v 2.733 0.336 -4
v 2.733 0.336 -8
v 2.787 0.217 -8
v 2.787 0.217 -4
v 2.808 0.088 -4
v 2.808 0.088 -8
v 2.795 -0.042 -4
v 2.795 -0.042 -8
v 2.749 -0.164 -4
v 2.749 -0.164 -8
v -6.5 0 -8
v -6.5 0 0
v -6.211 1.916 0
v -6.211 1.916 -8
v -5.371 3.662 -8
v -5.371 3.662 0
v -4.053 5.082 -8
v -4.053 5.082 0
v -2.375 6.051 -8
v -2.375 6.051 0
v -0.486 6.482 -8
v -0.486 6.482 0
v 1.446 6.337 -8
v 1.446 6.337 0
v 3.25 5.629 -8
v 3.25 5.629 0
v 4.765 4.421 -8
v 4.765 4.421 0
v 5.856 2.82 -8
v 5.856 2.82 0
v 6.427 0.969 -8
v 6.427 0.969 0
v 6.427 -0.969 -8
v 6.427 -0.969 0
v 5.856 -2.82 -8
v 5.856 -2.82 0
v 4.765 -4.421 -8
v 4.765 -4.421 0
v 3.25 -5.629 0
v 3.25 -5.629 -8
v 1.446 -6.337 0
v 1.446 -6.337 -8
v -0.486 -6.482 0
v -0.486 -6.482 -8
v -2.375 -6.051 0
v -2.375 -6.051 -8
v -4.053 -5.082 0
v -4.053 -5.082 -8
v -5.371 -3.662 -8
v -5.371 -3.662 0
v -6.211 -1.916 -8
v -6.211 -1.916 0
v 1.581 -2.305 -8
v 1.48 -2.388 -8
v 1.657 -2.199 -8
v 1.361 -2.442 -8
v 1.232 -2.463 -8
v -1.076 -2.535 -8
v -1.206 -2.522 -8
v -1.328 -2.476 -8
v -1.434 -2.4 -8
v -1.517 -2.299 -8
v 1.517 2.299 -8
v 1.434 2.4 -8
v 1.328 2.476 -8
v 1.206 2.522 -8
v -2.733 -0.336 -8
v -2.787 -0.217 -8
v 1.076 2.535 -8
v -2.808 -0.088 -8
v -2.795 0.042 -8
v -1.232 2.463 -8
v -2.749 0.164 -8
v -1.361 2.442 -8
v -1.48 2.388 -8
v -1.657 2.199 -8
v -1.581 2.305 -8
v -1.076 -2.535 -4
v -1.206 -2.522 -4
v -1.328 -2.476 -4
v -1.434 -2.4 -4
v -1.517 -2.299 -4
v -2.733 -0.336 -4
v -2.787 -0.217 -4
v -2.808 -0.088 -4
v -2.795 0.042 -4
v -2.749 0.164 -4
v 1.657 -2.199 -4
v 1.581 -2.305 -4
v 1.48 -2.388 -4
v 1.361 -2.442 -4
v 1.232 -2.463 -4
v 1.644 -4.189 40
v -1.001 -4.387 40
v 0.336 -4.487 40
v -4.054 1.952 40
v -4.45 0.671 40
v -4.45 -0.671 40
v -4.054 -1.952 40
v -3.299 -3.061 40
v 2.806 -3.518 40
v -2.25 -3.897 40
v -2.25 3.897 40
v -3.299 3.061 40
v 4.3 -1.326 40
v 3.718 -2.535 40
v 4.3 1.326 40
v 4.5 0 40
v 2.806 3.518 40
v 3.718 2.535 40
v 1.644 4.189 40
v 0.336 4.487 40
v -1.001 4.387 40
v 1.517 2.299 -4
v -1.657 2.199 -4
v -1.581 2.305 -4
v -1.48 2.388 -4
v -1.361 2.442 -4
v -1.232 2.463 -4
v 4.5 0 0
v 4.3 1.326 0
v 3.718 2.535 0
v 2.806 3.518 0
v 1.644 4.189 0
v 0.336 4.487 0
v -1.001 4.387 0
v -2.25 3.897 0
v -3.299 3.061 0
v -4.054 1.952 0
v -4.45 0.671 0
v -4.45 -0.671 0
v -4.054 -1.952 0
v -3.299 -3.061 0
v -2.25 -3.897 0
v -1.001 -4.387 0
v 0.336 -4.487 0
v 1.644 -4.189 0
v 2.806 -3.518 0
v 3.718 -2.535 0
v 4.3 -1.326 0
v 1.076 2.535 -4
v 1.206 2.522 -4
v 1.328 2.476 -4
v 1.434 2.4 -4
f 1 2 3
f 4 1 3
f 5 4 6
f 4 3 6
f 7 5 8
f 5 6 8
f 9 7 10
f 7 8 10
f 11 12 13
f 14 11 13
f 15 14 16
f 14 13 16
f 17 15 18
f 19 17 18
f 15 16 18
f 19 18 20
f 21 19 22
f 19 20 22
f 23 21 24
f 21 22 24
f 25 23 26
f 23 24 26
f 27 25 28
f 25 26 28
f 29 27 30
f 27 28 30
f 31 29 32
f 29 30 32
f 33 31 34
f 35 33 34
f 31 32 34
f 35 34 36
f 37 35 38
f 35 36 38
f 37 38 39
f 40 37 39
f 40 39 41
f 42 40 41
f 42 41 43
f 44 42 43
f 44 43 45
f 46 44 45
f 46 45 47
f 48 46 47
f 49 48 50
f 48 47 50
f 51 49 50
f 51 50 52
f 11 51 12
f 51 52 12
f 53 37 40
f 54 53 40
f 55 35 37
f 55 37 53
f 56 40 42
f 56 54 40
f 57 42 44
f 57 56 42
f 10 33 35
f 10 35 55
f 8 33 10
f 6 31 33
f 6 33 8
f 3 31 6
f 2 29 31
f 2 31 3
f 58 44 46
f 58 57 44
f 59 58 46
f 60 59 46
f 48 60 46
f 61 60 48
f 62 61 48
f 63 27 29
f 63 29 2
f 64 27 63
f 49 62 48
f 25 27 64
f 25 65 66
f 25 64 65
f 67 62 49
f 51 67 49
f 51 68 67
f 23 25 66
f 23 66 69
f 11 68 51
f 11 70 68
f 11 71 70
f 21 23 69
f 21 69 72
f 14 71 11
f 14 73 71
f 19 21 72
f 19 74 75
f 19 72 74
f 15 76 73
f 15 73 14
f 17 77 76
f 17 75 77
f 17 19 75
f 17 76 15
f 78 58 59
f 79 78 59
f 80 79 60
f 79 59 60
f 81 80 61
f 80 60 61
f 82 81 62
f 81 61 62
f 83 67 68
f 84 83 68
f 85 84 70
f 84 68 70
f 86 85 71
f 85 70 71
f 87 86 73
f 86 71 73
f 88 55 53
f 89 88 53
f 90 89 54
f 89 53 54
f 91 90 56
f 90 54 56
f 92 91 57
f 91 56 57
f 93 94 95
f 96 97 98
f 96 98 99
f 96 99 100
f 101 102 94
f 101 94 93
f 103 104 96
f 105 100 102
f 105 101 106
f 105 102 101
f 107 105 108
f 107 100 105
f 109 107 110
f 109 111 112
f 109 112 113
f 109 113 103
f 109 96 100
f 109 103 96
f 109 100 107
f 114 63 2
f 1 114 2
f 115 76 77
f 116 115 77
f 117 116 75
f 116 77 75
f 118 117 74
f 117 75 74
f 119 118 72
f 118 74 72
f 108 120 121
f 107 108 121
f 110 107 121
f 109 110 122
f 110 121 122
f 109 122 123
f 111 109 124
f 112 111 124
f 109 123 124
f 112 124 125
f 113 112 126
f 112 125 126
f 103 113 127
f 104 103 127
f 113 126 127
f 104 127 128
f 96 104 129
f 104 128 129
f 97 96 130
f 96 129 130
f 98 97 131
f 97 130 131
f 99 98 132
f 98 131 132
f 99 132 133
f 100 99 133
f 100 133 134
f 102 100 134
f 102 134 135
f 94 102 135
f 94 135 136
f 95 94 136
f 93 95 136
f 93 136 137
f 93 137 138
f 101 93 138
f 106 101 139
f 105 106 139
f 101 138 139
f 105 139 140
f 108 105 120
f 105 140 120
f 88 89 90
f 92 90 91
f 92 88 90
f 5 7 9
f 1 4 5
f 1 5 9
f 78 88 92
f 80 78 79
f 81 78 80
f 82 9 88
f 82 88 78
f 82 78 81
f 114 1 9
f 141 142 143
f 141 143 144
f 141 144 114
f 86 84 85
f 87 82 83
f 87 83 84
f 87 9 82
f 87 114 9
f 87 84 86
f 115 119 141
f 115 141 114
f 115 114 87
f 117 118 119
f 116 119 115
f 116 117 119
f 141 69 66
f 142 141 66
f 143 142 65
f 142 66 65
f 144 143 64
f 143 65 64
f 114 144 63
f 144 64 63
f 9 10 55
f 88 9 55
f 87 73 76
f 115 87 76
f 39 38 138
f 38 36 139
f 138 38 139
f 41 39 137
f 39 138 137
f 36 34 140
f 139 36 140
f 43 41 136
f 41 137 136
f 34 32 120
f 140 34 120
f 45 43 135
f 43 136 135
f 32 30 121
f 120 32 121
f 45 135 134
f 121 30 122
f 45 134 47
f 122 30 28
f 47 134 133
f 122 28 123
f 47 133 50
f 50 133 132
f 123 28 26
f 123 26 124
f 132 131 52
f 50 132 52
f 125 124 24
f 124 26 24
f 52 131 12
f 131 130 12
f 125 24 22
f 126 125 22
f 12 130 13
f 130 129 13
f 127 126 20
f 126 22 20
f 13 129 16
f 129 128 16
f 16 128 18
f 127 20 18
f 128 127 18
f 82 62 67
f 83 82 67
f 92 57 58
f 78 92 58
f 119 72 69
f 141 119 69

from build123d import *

# Parameters (mm, degrees)
SKETCH_1_R          = 4.5
EXTRUDE_1_DEPTH     = 40
SKETCH_2_R          = 6.5
EXTRUDE_2_DEPTH     = 8
CUT_EXTRUDE_1_DEPTH = 4


with BuildPart() as part:
    # 스케치1 → 보스-돌출1 (new body)
    with BuildSketch(Plane.XY):
        Circle(SKETCH_1_R)
    extrude(amount=EXTRUDE_1_DEPTH)

    # 스케치2 → 보스-돌출2 (add)
    with BuildSketch(Plane(origin=(0, 0, 0), x_dir=(-1, 0, 0), z_dir=(0, 0, -1))):
        Circle(SKETCH_2_R)
    extrude(amount=EXTRUDE_2_DEPTH)

    # 스케치3 → 컷-돌출1 (cut)
    with BuildSketch(Plane(origin=(0, 0, -8), x_dir=(-1, 0, 0), z_dir=(0, 0, -1))):
        with BuildLine():
            Line((1.51655612, -2.298562783), (2.733251781, -0.335660595))
            ThreePointArc((2.733251781, -0.335660595), (2.80802632, -0.087878298), (2.748891822, 0.164094734))
            Line((2.748891822, 0.164094734), (1.657316493, 2.19923518))
            ThreePointArc((1.657316493, 2.19923518), (1.480117999, 2.387882979), (1.232335703, 2.462657518))
            Line((1.232335703, 2.462657518), (-1.075935288, 2.534895775))
            ThreePointArc((-1.075935288, 2.534895775), (-1.327908321, 2.475761277), (-1.51655612, 2.298562783))
            Line((-1.51655612, 2.298562783), (-2.733251781, 0.335660595))
            ThreePointArc((-2.733251781, 0.335660595), (-2.80802632, 0.087878298), (-2.748891822, -0.164094734))
            Line((-2.748891822, -0.164094734), (-1.657316493, -2.19923518))
            ThreePointArc((-1.657316493, -2.19923518), (-1.480117999, -2.387882979), (-1.232335703, -2.462657518))
            Line((-1.232335703, -2.462657518), (1.075935288, -2.534895775))
            ThreePointArc((1.075935288, -2.534895775), (1.327908321, -2.475761277), (1.51655612, -2.298562783))
        make_face()
    extrude(amount=-CUT_EXTRUDE_1_DEPTH, mode=Mode.SUBTRACT)


solid = part.part
